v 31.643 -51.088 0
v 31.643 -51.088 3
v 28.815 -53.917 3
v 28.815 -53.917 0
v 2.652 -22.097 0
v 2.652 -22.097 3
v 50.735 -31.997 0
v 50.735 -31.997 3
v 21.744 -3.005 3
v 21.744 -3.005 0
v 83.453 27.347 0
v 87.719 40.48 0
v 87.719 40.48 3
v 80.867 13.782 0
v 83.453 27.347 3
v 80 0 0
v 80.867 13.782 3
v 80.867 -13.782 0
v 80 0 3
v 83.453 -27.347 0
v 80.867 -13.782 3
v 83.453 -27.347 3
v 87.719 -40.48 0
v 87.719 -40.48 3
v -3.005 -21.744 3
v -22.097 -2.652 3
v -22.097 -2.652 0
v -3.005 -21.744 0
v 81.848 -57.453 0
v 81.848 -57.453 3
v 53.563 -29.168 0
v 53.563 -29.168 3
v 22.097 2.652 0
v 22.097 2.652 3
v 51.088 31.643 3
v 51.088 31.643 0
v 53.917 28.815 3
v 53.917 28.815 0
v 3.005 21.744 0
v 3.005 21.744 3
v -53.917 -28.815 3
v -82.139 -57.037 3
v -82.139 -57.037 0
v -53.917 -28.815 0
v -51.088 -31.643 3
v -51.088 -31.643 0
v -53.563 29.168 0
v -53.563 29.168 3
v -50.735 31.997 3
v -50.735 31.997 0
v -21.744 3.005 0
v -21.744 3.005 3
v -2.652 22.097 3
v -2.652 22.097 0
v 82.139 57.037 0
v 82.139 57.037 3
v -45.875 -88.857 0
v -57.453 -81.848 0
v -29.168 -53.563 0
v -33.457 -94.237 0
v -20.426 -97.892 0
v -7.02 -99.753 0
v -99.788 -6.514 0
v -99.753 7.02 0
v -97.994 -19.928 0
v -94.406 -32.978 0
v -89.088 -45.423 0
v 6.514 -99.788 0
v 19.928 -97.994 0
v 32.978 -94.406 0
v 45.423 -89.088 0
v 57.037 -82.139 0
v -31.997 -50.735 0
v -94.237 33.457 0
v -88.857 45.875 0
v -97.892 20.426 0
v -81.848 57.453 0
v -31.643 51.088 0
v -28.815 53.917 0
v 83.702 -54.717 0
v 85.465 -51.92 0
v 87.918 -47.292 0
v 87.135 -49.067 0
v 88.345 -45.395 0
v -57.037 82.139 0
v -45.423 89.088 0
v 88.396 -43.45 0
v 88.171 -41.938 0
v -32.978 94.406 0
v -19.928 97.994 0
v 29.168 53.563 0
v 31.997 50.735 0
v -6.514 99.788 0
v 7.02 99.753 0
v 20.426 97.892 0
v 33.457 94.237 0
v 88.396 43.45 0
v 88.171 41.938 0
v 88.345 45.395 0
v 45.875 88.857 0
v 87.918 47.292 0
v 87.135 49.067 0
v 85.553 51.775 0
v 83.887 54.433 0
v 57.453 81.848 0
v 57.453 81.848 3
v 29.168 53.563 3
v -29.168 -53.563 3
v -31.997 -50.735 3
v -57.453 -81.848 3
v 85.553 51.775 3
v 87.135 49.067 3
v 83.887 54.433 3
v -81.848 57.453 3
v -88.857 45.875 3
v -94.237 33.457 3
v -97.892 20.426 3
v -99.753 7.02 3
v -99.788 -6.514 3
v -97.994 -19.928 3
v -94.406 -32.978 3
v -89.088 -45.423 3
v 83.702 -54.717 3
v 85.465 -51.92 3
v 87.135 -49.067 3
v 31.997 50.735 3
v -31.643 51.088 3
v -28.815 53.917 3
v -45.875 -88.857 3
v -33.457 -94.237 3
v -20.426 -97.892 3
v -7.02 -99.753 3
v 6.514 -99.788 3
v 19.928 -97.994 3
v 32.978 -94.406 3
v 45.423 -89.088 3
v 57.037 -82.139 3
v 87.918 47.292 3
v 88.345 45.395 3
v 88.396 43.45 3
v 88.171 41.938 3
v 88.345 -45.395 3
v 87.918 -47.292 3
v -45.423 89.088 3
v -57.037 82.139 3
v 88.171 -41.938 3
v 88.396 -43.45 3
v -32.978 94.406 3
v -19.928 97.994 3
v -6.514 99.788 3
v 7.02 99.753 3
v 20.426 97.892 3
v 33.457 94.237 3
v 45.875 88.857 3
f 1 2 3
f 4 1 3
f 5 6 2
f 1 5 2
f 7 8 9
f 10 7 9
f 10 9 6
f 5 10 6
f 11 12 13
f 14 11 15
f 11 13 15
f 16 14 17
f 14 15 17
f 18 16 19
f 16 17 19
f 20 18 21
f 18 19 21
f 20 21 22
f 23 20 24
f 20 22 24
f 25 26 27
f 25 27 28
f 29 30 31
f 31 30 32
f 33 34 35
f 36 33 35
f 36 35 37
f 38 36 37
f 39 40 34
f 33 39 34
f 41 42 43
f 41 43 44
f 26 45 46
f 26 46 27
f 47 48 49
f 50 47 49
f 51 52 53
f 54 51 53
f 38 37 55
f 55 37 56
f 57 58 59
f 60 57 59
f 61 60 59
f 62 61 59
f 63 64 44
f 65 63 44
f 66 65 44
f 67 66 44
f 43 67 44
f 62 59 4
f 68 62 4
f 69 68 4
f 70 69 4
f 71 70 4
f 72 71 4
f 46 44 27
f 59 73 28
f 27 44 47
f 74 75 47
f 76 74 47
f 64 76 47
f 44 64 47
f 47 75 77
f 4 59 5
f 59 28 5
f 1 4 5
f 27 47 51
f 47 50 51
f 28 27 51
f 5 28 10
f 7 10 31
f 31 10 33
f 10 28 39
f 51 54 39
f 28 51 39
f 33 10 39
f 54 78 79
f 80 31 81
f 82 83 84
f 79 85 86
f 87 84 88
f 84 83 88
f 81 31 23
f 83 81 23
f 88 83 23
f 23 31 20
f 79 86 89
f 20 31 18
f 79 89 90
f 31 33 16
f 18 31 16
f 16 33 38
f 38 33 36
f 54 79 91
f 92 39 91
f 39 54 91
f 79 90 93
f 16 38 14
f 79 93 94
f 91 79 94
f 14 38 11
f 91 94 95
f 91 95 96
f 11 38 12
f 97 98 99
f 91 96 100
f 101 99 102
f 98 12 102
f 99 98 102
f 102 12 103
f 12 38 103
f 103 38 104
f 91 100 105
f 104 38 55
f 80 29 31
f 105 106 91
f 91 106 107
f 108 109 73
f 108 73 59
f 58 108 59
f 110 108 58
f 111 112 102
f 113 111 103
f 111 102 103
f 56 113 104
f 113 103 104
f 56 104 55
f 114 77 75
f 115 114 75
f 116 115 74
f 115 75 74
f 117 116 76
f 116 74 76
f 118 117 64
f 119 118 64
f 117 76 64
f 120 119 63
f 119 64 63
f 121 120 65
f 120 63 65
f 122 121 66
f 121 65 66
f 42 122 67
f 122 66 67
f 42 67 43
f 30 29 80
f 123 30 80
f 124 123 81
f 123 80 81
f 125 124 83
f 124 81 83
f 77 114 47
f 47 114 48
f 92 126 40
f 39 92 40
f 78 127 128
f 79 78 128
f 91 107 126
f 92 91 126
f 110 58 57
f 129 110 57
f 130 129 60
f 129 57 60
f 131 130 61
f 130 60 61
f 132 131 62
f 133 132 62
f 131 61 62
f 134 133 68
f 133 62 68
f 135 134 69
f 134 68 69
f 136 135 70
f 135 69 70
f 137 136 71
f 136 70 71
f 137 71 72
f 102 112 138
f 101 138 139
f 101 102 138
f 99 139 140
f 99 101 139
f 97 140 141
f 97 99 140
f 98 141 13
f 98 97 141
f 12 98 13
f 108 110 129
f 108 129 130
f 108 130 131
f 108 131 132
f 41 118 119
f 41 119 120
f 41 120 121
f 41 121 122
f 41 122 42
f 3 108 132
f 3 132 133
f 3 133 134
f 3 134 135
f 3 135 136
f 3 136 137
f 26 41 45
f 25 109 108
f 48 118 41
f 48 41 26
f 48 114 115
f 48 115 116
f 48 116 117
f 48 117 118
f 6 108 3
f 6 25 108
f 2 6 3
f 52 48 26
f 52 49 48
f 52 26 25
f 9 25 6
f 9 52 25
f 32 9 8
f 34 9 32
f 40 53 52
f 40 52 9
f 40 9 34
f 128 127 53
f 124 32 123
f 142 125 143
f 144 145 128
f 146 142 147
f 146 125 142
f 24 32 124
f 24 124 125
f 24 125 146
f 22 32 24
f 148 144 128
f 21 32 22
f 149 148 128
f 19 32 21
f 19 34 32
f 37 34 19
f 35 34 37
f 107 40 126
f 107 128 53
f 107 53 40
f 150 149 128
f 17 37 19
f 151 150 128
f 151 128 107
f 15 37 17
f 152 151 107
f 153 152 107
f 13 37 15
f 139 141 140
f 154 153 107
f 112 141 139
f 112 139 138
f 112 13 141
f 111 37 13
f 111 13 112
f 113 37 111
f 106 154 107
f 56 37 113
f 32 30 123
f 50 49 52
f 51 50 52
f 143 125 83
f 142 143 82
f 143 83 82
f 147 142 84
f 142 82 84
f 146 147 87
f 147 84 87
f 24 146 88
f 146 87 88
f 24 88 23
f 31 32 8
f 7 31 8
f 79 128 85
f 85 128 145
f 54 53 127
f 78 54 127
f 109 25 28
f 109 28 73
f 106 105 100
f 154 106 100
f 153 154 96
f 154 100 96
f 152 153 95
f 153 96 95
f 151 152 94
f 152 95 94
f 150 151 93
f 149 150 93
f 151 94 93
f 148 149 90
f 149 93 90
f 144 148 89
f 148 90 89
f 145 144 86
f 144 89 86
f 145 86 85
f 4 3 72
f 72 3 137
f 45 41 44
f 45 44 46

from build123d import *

# Parameters (mm, degrees)
CROQUIS1_R              = 100
SALIENTE_EXTRUIR1_DEPTH = 3
CROQUIS3_R              = 110
CORTAR_EXTRUIR1_DEPTH   = 3
REDONDEO1_R             = 10
CORTAR_EXTRUIR2_DEPTH   = 142.453172607


with BuildPart() as part:
    # Croquis1 → Saliente-Extruir1 (new body)
    with BuildSketch(Plane.XY):
        Circle(CROQUIS1_R)
    extrude(amount=SALIENTE_EXTRUIR1_DEPTH)

    # Croquis3 → Cortar-Extruir1 (cut)
    with BuildSketch(Plane.XY.offset(3)):
        with Locations((190, 0)):
            Circle(CROQUIS3_R)
    extrude(amount=-CORTAR_EXTRUIR1_DEPTH, mode=Mode.SUBTRACT)

    # Redondeo1
    redondeo1_edges = [part.edges().sort_by_distance(p)[0] for p in [
        (89.473684211, -44.659375654, 1.5),
        (89.473684211, 44.659375654, 1.5),
    ]]
    fillet(redondeo1_edges, radius=REDONDEO1_R)

    # Croquis4 → Cortar-Extruir2 (cut, through all)
    with BuildSketch(Plane.XY.offset(3)):
        Polygon((-58.513086143, -82.908270094), (-83.261823485, -58.159532753), (-53.916892065, -28.814601333), (-51.088464941, -31.643028458), (-22.097086912, -2.651650429), (-3.00520382, -21.743533521), (-31.996581849, -50.73491155), (-29.168154724, -53.563338675), align=None)
        Polygon((-82.908270094, 58.513086143), (-53.563338675, 29.168154724), (-50.73491155, 31.996581849), (-21.743533521, 3.00520382), (-2.651650429, 22.097086912), (-31.643028458, 51.088464941), (-28.814601333, 53.916892065), (-58.159532753, 83.261823485), align=None)
        Polygon((58.513086143, 82.908270094), (29.168154724, 53.563338675), (31.996581849, 50.73491155), (3.00520382, 21.743533521), (22.097086912, 2.651650429), (51.088464941, 31.643028458), (53.916892065, 28.814601333), (83.261823485, 58.159532753), align=None)
        Polygon((82.908270094, -58.513086143), (53.563338675, -29.168154724), (50.73491155, -31.996581849), (21.743533521, -3.00520382), (2.651650429, -22.097086912), (31.643028458, -51.088464941), (28.814601333, -53.916892065), (58.159532753, -83.261823485), align=None)
    extrude(amount=-CORTAR_EXTRUIR2_DEPTH, mode=Mode.SUBTRACT)


solid = part.part
